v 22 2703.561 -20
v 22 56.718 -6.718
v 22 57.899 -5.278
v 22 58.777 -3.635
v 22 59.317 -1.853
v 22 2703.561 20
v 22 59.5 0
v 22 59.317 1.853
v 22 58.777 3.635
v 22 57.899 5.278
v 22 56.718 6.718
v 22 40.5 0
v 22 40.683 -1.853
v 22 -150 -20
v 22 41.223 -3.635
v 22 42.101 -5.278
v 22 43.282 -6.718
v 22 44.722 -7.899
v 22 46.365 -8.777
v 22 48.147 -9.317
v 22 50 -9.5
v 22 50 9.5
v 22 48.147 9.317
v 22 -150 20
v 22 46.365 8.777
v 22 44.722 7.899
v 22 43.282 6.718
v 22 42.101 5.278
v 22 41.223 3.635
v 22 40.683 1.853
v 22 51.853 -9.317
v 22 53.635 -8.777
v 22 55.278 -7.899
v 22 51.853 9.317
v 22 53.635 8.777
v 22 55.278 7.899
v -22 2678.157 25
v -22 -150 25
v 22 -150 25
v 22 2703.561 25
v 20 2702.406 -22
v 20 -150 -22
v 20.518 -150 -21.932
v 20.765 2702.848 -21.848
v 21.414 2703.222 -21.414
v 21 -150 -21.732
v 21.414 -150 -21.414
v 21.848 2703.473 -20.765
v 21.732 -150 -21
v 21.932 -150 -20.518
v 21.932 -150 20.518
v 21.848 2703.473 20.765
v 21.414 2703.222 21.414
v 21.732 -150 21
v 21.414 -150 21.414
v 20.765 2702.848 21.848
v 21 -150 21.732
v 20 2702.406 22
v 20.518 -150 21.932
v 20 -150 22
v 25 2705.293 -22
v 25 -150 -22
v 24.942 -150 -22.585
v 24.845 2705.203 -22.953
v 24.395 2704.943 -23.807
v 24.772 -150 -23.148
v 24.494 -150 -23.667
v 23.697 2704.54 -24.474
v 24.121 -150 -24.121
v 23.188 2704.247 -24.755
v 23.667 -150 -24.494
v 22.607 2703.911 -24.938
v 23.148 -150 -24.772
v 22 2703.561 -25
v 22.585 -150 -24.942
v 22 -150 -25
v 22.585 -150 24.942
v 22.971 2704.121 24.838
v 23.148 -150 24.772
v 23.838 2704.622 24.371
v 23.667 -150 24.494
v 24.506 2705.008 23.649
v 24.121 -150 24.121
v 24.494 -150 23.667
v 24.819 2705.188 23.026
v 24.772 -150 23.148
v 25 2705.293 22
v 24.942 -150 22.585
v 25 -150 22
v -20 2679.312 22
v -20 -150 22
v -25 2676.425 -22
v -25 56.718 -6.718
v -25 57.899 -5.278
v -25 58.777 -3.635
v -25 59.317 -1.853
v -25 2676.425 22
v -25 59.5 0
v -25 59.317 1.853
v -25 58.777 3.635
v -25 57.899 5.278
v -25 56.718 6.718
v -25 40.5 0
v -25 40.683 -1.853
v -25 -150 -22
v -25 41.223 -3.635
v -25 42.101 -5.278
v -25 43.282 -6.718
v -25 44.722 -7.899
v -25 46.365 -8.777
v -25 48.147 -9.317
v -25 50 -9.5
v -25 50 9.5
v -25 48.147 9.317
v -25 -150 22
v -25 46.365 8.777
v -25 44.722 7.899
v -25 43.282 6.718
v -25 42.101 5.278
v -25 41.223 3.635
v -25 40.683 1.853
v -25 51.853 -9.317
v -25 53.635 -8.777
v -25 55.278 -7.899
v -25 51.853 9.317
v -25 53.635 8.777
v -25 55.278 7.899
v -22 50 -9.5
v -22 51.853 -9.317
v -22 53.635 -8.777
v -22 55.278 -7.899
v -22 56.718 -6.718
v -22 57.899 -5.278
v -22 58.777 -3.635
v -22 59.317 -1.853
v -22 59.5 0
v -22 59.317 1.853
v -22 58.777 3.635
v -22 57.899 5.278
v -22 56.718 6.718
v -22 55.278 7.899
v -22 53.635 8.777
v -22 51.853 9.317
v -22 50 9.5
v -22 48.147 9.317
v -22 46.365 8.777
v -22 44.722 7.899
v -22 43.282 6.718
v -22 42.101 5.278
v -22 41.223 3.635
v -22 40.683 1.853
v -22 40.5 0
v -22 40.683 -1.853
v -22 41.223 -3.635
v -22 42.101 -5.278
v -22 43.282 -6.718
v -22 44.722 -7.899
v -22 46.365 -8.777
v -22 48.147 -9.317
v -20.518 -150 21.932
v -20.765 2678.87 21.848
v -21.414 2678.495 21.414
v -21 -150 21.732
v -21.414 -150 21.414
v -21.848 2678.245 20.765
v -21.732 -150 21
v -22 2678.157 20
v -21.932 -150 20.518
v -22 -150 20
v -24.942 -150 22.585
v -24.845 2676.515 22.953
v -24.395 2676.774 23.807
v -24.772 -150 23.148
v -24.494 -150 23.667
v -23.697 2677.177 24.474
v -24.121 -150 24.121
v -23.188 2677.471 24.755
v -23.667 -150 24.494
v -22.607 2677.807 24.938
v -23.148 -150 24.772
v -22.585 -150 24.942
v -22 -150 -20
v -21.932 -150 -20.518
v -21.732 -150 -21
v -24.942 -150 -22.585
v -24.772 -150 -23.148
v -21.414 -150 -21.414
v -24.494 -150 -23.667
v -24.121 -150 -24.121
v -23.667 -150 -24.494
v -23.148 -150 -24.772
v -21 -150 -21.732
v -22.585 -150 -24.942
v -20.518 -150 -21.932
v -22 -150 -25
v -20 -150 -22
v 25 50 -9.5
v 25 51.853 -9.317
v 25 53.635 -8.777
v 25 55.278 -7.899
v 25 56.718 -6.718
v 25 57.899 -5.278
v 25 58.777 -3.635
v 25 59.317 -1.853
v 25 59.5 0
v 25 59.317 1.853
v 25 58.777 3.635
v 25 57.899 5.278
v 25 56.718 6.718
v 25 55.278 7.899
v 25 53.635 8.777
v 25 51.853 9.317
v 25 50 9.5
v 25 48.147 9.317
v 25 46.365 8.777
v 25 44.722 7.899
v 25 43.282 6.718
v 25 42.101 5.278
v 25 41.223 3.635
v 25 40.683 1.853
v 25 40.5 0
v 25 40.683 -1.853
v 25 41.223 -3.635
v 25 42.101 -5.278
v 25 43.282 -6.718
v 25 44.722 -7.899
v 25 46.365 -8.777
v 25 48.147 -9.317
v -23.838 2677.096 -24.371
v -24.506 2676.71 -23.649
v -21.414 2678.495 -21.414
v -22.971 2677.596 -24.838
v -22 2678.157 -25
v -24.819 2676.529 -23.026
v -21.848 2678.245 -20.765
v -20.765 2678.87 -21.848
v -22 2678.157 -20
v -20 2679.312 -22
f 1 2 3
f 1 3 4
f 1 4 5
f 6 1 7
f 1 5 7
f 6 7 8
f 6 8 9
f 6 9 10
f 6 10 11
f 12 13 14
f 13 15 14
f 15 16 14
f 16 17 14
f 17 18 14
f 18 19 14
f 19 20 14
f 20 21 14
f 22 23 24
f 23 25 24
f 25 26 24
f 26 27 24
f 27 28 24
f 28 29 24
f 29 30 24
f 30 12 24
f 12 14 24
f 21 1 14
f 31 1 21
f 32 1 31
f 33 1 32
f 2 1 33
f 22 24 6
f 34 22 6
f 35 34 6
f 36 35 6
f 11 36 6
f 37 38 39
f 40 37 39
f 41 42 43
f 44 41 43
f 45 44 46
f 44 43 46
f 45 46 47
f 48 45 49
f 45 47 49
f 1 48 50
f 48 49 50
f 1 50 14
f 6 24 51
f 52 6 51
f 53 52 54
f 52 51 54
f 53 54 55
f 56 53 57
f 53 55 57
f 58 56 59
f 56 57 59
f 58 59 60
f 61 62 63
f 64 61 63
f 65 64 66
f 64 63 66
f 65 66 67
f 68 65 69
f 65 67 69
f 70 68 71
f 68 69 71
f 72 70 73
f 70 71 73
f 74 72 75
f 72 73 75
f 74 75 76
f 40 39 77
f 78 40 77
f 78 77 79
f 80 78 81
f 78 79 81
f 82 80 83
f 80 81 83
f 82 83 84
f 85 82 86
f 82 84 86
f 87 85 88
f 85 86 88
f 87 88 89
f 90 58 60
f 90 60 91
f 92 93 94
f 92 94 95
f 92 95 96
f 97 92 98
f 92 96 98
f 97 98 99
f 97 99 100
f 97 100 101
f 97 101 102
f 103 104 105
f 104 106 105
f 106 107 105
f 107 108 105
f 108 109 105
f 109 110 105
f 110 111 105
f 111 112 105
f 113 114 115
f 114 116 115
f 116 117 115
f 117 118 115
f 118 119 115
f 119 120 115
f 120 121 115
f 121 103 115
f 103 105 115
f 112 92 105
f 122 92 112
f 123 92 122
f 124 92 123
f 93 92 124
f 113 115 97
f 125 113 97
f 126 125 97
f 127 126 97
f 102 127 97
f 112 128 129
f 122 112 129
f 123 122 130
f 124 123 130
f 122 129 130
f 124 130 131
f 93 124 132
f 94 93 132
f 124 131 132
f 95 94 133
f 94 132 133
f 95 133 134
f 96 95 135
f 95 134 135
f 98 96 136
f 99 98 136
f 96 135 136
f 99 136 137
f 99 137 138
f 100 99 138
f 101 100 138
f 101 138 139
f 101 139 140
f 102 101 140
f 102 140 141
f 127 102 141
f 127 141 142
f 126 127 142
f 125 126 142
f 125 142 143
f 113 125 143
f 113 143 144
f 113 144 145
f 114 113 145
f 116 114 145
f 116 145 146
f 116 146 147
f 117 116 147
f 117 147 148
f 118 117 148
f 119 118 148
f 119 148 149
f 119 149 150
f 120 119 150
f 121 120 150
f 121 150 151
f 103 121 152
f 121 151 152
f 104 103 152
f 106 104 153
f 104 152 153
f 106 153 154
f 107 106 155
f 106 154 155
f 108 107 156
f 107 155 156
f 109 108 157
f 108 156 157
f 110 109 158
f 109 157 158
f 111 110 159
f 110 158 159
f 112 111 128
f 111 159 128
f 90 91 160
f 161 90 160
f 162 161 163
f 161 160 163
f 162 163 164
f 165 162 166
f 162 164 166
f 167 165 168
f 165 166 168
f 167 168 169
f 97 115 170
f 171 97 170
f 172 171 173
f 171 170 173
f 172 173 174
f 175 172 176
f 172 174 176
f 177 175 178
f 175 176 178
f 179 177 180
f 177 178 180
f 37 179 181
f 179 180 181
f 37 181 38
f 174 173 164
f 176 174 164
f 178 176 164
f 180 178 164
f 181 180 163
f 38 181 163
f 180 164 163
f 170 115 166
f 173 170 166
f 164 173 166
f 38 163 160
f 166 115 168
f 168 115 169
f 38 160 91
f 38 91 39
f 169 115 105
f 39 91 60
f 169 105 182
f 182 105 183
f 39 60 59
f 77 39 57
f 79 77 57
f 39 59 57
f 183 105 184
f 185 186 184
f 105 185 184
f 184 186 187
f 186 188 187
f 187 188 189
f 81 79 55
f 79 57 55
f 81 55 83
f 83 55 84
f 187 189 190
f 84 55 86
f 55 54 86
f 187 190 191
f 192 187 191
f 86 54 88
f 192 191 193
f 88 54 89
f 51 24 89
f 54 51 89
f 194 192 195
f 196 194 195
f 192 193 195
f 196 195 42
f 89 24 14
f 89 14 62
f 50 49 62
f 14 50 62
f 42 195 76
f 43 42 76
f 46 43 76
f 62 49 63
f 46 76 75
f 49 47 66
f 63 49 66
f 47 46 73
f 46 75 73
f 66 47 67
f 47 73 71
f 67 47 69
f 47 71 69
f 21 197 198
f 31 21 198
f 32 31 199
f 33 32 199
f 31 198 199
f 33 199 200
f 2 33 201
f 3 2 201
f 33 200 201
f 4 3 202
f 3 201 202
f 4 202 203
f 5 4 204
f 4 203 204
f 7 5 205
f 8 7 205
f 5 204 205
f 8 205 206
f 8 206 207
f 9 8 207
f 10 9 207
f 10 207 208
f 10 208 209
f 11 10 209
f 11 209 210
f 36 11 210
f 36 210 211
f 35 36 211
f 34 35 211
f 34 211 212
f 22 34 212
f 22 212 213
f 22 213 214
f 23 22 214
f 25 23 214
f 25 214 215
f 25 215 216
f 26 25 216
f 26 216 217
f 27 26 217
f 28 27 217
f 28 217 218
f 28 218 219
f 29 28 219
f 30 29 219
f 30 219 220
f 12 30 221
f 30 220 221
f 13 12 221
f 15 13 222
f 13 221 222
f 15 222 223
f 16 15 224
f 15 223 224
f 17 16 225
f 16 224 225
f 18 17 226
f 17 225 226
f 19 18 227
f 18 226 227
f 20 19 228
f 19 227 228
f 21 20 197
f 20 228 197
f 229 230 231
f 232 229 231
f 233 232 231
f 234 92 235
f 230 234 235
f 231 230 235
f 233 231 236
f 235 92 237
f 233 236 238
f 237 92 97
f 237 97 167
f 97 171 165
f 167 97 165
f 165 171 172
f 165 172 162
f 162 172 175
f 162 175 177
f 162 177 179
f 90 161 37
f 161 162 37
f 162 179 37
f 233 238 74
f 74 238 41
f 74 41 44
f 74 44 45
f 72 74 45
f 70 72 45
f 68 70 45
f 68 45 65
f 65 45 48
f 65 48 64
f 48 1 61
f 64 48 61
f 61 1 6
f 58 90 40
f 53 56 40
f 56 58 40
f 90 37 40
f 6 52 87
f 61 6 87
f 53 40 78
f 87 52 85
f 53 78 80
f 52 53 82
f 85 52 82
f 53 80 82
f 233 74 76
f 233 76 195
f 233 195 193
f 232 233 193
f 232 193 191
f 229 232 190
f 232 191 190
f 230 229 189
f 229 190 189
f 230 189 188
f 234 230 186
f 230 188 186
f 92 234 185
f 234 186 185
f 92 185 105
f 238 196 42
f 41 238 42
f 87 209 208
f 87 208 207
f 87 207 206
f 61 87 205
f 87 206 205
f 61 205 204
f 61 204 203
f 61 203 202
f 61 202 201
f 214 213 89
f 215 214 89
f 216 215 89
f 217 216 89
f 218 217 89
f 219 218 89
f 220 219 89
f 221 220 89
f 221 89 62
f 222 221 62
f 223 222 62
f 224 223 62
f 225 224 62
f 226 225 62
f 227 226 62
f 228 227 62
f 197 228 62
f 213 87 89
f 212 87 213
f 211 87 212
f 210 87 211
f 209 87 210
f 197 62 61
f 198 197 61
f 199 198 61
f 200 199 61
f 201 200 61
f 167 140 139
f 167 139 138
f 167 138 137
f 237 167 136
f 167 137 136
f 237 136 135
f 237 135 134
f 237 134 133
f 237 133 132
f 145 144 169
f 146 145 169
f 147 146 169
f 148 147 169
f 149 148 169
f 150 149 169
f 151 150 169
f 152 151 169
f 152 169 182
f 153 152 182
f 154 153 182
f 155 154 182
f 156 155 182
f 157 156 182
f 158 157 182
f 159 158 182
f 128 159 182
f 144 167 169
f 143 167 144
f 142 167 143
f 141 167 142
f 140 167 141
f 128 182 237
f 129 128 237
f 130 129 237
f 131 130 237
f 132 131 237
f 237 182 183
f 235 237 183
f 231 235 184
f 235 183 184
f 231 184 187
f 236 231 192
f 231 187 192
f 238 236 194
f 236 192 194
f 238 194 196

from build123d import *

# Parameters (mm, degrees)
EXTRUDE_START         = -150
EXTRUDE_1_DEPTH       = 2855.29255553
EXTRUDE_START_2       = -2356
EXTRUDE_1_2_OUTLINE_W = 61
EXTRUDE_1_2_OUTLINE_H = 53
EXTRUDE_1_2_DEPTH     = 25.647922242
SKETCH_2_R            = 9.5
CUT_EXTRUDE_1_DEPTH   = 2706.870065433


with BuildPart() as part:
    # Бобышка-Вытянуть1: read off the stored shape, not the designer's step
    # Бобышка-Вытянуть1 outline → Бобышка-Вытянуть1 (new body)
    with BuildSketch(Plane(origin=(0, 0, 0), x_dir=(1, 0, 0), z_dir=(0, 1, 0)).offset(EXTRUDE_START)):
        with BuildLine():
            Line((-25, 22), (-25, -22))
            ThreePointArc((-25, -22), (-24.121320344, -24.121320344), (-22, -25))
            Line((-22, -25), (22, -25))
            ThreePointArc((22, -25), (24.121320344, -24.121320344), (25, -22))
            Line((25, -22), (25, 22))
            ThreePointArc((25, 22), (24.121320344, 24.121320344), (22, 25))
            Line((22, 25), (-22, 25))
            ThreePointArc((-22, 25), (-24.121320344, 24.121320344), (-25, 22))
        make_face()
        with BuildLine():
            ThreePointArc((-20, -22), (-21.414213562, -21.414213562), (-22, -20))
            Line((-22, -20), (-22, 20))
            ThreePointArc((-22, 20), (-21.414213562, 21.414213562), (-20, 22))
            Line((-20, 22), (20, 22))
            ThreePointArc((20, 22), (21.414213562, 21.414213562), (22, 20))
            Line((22, 20), (22, -20))
            ThreePointArc((22, -20), (21.414213562, -21.414213562), (20, -22))
            Line((20, -22), (-20, -22))
        make_face(mode=Mode.SUBTRACT)
    extrude(amount=EXTRUDE_1_DEPTH)

    # Extrude 1 2 outline → Extrude 1 2 (cut)
    with BuildSketch(Plane(origin=(0, 0, 0), x_dir=(0.8660254037844386, 0.4999999999999999, 0), z_dir=(0.4999999999999999, -0.8660254037844388, 0)).offset(EXTRUDE_START_2)):
        with Locations((1345.5, -0.5)):
            Rectangle(EXTRUDE_1_2_OUTLINE_W, EXTRUDE_1_2_OUTLINE_H)
    extrude(amount=EXTRUDE_1_2_DEPTH, mode=Mode.SUBTRACT)

    # Эскиз2 → Вырез-Вытянуть1 (cut, through all)
    with BuildSketch(Plane(origin=(25, 0, 0), x_dir=(0, 0, -1), z_dir=(1, 0, 0))):
        with Locations((0, 50)):
            Circle(SKETCH_2_R)
    extrude(amount=-CUT_EXTRUDE_1_DEPTH, mode=Mode.SUBTRACT)


solid = part.part
